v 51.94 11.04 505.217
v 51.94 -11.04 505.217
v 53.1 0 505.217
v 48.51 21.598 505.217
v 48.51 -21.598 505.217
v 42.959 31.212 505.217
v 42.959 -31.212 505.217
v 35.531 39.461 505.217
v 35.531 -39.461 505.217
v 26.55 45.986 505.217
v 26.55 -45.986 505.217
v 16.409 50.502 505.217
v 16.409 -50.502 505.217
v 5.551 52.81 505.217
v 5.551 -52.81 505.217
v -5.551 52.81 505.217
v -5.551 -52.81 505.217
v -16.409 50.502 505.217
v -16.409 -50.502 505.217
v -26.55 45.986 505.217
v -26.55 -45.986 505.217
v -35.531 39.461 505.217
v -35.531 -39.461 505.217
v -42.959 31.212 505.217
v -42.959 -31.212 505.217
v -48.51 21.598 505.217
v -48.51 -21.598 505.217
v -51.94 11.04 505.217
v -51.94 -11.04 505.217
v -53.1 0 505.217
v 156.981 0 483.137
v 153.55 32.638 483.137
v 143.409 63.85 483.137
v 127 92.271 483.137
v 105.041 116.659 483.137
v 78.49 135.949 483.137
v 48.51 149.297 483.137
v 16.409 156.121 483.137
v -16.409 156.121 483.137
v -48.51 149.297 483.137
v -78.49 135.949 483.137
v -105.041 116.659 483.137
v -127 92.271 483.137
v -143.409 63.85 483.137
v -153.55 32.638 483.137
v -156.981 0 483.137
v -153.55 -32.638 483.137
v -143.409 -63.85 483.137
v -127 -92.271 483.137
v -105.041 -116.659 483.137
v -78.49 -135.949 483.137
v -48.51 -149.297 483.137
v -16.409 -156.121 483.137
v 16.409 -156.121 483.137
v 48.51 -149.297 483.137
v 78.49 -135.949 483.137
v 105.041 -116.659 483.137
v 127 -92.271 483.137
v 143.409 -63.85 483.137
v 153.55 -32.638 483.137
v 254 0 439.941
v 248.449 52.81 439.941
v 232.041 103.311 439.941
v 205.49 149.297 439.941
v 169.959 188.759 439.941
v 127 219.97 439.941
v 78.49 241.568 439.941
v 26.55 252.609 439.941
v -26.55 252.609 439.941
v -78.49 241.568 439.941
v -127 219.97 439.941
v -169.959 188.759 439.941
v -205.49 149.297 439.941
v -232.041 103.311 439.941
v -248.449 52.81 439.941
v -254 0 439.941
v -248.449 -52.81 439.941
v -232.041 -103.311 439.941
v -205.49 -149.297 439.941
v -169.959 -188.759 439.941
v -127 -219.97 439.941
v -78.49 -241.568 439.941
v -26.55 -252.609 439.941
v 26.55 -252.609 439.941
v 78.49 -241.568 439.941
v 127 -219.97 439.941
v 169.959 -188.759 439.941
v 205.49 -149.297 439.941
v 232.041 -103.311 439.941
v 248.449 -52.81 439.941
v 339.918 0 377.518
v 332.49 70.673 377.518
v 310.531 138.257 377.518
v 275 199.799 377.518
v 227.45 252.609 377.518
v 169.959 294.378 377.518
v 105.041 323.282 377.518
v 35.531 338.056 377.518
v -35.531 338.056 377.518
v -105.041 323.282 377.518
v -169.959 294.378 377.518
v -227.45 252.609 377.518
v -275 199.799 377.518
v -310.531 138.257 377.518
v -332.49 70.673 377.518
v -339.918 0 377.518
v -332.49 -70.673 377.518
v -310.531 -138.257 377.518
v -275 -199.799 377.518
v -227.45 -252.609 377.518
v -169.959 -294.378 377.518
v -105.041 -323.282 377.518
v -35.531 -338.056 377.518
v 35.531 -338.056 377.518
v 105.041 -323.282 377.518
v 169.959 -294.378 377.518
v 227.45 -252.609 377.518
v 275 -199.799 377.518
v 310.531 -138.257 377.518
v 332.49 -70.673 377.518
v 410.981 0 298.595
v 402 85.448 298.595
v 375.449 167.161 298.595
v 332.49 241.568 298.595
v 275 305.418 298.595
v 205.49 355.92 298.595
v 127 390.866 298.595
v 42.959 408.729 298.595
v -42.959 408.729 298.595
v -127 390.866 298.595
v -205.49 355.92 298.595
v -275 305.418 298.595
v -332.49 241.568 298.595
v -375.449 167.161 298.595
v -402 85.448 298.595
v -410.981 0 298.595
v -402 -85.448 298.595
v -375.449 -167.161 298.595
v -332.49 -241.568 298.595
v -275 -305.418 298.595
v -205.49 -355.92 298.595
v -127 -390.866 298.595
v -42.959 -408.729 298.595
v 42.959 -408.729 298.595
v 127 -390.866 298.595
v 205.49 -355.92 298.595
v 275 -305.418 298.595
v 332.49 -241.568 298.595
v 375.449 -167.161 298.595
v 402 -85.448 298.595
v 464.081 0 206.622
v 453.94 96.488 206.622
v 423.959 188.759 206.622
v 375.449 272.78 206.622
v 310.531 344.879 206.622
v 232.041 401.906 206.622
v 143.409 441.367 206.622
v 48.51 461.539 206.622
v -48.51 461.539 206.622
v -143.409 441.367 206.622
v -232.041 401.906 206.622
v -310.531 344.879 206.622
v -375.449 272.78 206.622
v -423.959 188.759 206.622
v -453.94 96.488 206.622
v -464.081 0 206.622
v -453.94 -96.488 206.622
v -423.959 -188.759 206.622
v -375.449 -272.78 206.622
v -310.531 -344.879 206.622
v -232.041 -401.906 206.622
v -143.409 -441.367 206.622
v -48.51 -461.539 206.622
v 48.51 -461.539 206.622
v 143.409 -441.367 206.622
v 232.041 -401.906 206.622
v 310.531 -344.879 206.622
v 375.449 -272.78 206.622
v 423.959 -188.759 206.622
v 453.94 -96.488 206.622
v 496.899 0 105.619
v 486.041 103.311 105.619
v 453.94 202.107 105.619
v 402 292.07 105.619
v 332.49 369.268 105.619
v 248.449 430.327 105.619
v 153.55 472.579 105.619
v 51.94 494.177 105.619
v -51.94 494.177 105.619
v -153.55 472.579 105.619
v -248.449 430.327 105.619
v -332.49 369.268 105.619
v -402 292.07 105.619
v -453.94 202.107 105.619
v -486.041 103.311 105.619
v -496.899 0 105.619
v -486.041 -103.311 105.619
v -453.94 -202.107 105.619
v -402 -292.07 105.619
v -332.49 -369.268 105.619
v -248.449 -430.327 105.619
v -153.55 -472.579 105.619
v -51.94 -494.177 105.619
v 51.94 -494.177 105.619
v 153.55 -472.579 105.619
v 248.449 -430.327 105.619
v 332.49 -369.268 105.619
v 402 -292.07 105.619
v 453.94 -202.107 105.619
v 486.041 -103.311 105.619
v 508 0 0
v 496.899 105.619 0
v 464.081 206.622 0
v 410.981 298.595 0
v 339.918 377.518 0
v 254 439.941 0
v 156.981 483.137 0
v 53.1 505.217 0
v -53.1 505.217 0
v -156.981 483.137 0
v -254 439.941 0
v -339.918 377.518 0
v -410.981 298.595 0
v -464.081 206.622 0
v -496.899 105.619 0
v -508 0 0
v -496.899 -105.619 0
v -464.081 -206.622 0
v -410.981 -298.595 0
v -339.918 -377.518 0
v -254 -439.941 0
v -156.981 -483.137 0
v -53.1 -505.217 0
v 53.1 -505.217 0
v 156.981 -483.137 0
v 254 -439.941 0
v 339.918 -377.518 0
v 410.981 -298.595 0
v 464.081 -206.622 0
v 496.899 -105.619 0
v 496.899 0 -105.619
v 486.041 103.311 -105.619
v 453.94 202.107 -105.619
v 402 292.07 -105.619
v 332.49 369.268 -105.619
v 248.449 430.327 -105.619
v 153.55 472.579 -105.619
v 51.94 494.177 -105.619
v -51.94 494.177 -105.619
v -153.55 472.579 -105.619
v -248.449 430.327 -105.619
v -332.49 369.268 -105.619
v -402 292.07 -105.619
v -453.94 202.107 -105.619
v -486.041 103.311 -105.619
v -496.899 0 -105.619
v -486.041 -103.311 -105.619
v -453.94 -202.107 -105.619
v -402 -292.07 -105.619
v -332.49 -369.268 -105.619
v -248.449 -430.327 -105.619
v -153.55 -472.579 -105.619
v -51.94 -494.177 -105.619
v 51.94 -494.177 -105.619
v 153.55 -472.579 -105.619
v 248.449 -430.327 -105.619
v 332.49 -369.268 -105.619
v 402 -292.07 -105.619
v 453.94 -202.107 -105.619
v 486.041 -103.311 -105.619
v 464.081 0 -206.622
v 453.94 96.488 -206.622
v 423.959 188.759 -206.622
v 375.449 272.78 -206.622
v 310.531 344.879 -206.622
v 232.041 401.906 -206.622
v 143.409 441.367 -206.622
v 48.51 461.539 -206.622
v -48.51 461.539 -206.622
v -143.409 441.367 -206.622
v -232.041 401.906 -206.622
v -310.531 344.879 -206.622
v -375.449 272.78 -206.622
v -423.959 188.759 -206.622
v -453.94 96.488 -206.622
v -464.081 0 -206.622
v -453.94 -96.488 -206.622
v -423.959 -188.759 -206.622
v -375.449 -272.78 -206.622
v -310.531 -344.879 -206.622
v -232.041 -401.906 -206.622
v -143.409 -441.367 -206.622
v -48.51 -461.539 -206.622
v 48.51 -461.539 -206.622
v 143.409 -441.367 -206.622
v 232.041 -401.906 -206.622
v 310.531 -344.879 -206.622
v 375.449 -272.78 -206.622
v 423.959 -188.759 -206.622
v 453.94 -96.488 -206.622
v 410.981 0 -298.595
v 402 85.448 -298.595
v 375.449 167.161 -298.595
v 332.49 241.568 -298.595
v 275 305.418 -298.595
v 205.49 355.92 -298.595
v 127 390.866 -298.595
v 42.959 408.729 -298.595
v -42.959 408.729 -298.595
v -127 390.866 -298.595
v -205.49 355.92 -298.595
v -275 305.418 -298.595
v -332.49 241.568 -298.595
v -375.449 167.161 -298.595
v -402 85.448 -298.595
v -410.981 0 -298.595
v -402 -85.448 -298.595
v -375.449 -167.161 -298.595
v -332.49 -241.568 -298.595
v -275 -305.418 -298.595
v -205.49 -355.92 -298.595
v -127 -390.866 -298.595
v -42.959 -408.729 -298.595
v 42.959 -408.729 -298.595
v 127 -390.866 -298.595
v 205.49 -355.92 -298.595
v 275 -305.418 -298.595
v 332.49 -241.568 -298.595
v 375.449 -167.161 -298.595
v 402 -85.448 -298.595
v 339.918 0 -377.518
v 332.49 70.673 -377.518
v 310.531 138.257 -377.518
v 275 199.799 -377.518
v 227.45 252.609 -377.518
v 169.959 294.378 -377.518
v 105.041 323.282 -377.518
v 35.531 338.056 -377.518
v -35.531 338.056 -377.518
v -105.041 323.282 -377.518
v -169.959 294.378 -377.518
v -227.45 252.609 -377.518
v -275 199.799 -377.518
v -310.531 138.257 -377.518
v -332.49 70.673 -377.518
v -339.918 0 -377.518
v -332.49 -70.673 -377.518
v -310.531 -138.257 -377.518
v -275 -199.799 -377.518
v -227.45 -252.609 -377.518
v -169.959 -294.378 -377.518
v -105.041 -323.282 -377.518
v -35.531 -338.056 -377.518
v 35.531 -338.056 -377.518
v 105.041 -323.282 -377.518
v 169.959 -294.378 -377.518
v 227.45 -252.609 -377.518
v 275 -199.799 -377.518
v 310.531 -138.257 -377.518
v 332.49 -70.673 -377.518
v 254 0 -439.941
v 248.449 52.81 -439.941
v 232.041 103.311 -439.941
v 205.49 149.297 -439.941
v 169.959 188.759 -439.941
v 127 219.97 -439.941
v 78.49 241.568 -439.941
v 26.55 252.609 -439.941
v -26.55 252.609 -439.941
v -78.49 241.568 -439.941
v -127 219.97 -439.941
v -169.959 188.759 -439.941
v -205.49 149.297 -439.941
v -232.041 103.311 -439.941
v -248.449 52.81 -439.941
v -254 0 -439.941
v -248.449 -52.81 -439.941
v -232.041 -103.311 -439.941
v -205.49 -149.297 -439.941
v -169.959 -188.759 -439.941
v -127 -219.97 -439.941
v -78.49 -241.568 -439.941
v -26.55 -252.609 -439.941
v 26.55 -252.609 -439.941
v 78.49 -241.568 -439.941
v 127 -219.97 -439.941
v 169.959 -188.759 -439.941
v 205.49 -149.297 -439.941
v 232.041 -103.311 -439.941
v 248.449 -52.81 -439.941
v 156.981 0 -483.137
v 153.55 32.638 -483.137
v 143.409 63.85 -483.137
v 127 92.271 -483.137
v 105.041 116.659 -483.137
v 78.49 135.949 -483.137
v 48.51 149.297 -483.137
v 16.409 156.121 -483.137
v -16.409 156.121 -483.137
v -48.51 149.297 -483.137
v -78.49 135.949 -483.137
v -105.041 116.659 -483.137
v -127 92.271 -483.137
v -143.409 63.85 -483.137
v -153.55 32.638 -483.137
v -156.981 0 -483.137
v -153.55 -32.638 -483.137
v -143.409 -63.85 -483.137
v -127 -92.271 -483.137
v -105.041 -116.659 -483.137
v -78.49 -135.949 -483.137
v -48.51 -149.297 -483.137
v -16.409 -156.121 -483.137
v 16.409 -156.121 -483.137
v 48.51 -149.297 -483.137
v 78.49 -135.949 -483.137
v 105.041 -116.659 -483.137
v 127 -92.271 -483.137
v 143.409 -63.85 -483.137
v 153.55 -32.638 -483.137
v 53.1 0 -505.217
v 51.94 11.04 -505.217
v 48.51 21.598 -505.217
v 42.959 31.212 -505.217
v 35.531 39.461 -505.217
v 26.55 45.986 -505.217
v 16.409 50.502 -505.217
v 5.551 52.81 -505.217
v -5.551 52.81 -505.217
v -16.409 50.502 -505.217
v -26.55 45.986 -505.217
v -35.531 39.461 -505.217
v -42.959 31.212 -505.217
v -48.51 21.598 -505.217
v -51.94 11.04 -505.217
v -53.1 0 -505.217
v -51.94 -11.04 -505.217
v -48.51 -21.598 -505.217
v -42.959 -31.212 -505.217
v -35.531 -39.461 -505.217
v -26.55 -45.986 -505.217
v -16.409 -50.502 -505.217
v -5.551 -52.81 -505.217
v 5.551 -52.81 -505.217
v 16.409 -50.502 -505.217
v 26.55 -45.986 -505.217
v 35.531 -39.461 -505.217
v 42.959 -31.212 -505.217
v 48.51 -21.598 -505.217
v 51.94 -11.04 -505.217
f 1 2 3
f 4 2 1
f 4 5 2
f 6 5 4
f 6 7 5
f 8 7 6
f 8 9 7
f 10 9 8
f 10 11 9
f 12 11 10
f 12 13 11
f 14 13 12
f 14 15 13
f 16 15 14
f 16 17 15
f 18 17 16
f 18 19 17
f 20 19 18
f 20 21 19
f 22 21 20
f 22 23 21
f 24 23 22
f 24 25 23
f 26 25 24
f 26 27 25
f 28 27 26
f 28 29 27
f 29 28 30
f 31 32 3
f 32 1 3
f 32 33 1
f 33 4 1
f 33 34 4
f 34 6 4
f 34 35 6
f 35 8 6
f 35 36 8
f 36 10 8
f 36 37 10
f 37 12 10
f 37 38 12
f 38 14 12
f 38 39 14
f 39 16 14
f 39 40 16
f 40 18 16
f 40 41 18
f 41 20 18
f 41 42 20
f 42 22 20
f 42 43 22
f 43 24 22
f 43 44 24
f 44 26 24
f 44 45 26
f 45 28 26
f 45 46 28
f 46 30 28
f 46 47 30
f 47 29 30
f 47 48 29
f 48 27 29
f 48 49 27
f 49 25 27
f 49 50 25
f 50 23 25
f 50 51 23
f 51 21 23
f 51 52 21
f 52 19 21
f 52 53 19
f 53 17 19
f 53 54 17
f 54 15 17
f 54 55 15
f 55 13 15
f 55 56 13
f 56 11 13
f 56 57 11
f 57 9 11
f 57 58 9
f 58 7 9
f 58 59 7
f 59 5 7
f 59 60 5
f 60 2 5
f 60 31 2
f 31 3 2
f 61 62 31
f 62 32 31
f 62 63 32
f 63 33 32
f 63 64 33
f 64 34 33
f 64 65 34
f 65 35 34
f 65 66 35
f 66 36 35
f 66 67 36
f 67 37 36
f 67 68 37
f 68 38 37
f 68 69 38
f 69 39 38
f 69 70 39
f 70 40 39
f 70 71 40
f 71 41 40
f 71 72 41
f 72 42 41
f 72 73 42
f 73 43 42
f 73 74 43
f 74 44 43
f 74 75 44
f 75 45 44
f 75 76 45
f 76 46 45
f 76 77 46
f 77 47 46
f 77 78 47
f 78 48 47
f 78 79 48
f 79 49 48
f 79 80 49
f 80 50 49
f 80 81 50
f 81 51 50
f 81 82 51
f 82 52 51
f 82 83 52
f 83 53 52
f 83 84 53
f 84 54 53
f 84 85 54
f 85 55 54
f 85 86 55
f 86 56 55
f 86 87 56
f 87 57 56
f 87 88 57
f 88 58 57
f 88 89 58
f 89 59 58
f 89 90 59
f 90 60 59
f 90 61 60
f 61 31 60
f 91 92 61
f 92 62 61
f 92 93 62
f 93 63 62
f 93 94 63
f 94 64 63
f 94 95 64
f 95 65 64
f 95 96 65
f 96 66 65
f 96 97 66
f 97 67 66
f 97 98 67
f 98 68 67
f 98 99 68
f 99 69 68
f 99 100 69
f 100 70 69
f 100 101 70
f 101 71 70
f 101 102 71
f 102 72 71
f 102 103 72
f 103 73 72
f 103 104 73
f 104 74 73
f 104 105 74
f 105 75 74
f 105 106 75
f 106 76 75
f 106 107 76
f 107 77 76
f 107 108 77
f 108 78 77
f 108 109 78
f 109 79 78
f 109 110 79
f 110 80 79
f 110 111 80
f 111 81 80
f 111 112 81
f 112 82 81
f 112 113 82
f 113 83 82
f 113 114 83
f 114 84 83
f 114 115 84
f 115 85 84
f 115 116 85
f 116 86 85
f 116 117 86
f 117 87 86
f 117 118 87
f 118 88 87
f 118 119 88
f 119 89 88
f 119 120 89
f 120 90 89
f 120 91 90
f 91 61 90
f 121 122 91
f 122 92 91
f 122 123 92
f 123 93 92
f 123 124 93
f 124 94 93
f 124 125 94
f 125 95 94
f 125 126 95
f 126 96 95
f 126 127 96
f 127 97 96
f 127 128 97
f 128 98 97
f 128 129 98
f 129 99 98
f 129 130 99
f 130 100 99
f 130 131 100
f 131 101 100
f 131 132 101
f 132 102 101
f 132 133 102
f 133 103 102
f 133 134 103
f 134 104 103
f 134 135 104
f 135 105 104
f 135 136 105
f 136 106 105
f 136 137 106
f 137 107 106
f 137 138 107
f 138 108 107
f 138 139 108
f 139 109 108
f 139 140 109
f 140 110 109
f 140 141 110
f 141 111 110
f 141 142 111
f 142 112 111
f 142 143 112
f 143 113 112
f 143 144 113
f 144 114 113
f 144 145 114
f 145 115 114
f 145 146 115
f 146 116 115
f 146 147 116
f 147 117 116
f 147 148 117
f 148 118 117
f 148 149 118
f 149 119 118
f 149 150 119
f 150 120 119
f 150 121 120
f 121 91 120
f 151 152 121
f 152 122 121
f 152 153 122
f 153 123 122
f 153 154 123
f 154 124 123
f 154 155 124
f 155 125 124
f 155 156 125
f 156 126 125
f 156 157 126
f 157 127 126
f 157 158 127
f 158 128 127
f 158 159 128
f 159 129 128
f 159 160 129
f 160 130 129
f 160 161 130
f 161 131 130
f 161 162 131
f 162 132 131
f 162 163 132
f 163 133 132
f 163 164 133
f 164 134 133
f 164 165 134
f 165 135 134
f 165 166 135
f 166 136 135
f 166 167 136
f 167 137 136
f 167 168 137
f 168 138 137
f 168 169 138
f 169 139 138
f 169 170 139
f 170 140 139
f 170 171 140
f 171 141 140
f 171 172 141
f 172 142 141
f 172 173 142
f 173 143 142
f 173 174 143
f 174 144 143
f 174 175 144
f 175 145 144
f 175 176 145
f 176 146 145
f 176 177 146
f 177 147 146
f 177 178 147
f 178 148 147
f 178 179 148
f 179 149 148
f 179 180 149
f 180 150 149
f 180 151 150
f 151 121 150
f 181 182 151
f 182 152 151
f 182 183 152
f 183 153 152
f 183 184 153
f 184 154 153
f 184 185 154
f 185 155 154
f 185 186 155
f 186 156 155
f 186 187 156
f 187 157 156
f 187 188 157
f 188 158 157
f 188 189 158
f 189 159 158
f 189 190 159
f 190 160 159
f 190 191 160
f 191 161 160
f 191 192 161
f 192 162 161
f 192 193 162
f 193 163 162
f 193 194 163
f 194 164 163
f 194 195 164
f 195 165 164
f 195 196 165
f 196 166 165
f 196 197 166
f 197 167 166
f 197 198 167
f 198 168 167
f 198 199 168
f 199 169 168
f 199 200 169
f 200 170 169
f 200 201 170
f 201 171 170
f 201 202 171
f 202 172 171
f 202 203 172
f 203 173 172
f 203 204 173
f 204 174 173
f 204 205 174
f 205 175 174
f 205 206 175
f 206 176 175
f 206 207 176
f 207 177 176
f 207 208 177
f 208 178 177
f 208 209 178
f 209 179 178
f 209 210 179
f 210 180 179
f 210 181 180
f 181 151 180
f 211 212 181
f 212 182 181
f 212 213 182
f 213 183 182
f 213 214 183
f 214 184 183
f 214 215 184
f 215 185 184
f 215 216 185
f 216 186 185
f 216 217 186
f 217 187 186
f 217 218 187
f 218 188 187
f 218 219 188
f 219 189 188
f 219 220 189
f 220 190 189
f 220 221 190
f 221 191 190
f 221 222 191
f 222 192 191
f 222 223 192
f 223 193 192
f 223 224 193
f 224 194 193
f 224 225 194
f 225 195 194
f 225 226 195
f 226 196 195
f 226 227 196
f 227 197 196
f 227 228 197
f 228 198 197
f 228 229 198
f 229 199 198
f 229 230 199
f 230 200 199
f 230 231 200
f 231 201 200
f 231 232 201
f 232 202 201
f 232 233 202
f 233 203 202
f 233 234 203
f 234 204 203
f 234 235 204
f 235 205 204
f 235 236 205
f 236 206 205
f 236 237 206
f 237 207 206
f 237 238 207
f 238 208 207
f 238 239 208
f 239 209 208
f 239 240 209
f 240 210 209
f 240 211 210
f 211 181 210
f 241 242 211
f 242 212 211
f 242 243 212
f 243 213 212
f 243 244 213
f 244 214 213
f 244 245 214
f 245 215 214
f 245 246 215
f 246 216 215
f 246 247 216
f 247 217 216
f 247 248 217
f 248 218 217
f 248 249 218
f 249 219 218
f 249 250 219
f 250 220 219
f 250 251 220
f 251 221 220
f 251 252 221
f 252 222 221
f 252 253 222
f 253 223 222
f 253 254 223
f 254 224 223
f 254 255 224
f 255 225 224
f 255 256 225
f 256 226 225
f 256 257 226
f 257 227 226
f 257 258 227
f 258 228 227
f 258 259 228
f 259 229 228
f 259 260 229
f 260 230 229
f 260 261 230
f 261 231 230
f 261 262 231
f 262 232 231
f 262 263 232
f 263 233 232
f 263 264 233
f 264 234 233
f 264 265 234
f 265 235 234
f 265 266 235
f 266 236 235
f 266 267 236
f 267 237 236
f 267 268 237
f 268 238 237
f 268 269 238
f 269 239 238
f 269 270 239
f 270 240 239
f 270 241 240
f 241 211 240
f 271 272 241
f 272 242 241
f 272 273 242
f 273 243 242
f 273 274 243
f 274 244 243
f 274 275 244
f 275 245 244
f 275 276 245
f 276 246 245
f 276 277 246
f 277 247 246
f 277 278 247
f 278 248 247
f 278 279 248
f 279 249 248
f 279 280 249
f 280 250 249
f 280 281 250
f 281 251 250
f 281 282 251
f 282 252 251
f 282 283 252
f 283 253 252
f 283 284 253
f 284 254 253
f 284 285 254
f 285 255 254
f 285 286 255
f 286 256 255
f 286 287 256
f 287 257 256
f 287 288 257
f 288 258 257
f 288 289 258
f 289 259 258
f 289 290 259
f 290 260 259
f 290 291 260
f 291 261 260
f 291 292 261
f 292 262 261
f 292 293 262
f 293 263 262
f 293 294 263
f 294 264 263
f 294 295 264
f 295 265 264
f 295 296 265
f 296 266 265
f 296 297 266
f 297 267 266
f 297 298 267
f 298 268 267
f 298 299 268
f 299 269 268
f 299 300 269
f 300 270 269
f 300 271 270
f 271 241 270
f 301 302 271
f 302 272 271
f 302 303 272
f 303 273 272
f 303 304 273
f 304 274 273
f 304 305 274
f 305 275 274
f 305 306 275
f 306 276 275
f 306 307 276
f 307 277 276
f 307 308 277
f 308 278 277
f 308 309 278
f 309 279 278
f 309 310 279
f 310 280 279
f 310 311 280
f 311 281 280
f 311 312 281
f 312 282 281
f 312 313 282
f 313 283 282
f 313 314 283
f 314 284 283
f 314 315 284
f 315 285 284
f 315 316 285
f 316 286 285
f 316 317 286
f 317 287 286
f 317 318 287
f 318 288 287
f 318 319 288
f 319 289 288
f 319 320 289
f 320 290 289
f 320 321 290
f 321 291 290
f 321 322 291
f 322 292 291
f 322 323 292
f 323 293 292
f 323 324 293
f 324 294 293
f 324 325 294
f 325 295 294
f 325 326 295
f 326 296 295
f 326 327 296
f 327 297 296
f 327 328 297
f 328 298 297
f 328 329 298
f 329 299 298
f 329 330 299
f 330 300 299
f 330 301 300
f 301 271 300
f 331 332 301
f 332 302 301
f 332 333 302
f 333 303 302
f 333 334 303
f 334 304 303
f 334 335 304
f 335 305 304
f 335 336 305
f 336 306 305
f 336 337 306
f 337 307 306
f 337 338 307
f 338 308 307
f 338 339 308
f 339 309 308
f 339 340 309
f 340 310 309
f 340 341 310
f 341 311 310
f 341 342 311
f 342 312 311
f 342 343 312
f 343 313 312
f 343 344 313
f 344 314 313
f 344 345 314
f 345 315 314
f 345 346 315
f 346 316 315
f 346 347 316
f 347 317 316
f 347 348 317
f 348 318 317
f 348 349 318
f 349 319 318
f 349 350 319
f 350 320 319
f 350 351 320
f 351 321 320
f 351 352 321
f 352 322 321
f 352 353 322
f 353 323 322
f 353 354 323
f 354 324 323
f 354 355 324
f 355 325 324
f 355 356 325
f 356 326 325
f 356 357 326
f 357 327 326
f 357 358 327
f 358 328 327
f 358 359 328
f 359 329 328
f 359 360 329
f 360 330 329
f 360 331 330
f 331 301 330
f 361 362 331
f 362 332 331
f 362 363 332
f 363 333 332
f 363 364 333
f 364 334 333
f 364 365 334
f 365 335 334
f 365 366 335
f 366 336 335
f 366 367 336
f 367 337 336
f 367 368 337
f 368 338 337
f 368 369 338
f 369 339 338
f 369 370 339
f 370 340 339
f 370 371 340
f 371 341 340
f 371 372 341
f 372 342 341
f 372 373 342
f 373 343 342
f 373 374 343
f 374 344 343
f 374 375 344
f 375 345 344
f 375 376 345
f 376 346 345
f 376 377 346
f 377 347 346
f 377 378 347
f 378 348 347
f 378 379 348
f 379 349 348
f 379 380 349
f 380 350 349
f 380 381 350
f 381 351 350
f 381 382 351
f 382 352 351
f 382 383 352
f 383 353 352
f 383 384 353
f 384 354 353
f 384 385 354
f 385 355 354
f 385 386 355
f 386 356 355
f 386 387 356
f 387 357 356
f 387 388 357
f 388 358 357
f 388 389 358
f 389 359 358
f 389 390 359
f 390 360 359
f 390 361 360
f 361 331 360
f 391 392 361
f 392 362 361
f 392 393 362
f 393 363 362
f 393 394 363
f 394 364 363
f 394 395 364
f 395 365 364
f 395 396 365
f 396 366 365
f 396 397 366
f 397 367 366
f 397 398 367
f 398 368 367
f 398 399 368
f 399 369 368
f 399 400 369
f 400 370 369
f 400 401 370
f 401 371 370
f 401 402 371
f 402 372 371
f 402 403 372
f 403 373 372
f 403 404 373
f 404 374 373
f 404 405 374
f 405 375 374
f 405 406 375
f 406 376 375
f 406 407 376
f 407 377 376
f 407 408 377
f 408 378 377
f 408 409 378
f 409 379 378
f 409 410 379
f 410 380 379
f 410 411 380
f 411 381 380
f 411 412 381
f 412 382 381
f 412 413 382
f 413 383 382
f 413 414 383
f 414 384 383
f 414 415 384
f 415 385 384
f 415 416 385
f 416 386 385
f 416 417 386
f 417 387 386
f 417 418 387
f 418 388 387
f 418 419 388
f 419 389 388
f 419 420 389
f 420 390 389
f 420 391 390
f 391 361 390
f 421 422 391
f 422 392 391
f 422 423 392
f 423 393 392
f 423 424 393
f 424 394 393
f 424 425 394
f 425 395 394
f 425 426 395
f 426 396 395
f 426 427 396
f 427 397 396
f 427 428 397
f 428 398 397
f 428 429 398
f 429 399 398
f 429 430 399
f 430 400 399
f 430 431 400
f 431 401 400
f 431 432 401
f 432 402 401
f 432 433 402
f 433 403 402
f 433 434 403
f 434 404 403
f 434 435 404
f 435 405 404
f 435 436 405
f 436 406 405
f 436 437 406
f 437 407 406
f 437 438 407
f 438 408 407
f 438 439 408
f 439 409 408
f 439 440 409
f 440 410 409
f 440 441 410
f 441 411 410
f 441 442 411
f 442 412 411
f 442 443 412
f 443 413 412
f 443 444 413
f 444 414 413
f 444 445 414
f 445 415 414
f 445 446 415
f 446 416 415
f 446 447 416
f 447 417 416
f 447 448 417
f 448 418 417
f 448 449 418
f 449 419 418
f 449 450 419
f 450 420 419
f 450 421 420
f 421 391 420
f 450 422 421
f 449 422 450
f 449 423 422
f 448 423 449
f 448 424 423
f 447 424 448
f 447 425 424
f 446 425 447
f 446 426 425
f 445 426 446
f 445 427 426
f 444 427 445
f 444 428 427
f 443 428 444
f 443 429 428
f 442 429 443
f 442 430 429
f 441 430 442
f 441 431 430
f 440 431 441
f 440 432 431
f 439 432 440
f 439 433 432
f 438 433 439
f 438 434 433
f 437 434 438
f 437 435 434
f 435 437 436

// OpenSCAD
// Unit of length: Unit.MM
sphere(r = 508.0, $fa = 12.0, $fs = 50.8, $fn = 0);
